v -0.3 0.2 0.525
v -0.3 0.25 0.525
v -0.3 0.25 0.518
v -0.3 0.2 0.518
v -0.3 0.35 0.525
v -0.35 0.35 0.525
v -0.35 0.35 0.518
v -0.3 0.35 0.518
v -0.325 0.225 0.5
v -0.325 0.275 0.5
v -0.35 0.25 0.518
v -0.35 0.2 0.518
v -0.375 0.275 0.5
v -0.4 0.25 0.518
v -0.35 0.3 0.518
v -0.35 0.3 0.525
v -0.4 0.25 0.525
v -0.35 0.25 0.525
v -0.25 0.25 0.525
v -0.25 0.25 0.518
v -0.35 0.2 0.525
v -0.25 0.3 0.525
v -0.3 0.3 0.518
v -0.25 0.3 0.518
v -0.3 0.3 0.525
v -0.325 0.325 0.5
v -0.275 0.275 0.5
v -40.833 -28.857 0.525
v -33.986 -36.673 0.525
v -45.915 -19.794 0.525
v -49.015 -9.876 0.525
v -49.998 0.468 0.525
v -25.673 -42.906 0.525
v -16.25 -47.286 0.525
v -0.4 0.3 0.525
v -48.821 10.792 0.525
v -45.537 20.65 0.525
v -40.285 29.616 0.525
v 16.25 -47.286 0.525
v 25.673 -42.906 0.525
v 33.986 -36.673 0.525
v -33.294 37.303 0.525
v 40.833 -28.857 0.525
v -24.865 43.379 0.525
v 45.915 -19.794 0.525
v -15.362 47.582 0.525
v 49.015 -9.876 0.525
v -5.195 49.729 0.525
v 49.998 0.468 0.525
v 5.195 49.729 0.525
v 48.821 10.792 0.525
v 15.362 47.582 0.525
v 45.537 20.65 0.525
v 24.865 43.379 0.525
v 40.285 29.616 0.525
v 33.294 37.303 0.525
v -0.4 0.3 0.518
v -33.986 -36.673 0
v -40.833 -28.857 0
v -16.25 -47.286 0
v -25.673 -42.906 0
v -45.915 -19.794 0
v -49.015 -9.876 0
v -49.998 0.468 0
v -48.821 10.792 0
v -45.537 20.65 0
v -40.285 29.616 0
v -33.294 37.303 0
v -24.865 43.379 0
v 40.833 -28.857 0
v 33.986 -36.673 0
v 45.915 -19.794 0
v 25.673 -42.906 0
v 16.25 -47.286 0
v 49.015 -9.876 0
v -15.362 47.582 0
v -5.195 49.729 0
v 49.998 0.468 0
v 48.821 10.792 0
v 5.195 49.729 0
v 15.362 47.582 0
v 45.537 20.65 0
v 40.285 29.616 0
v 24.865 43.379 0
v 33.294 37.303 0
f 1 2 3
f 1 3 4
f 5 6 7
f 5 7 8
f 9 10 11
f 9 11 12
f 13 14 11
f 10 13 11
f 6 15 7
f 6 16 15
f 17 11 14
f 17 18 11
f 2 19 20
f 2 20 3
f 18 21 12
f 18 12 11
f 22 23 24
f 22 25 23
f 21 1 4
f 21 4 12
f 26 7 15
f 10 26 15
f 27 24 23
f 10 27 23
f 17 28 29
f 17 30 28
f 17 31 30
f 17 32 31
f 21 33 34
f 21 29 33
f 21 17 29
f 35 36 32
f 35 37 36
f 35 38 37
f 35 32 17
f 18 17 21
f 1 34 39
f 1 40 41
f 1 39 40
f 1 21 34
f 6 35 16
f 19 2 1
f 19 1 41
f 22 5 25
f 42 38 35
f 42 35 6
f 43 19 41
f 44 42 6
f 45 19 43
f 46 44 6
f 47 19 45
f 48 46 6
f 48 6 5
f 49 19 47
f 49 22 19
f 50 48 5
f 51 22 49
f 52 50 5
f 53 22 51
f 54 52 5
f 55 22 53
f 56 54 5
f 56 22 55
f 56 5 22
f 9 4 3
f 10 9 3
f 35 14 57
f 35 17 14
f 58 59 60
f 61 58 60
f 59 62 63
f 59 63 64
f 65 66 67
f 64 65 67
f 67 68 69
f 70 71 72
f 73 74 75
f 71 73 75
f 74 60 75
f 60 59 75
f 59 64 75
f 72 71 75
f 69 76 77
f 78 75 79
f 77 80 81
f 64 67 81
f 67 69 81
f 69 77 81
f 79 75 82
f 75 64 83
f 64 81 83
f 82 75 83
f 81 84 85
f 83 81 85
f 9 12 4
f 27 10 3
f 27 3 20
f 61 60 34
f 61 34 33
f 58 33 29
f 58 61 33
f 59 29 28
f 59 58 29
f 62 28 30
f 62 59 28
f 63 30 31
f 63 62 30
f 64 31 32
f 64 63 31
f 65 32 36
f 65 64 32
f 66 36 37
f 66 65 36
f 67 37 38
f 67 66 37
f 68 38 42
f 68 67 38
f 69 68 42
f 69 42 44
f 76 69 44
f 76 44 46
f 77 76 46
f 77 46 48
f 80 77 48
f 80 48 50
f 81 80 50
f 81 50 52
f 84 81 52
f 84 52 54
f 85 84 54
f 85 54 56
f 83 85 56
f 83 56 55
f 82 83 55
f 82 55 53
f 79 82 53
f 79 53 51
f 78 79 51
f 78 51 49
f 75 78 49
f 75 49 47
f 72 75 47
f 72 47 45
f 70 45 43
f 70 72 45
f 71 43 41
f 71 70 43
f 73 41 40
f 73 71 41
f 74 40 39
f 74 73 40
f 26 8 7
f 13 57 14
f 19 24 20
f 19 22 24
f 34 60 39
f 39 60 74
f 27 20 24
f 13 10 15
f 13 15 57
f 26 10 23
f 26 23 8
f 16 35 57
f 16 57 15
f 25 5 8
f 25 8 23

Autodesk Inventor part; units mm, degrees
ref_plane "YZ Plane" through (0, 0, 0) normal (1, 0, 0) x (0, 1, 0)
ref_plane "XZ Plane" through (0, 0, 0) normal (0, 1, 0) x (-1, 0, 0)
ref_plane "XY Plane" through (0, 0, 0) normal (0, 0, 1) x (1, 0, 0)
sketch "Sketch1" plane through (0, 0, 0) normal (0, 0, 1) x (1, 0, 0)
  circle A0 centre (0, 0) radius 50
  line L0 (-16.25, -47.2857) -> (16.25, -47.2857)
  dimension "d1" = 32.5
  dimension "d2" = 100
extrude "Extrusion1" add sketch "Sketch1" along normal blind 0.525 contours A0 L0 picked at (-0.3738, -14.8613)
sketch "Sketch2" plane through (0, 0, 0.525) normal (0, 0, 1) x (1, 0, 0)
  arc A0 (16.25, -47.2857) -> (-16.25, -47.2857) centre (0, 0) ccw projected
  line L0 (-0.35, 0.35) -> (-0.3, 0.35)
  line L1 (-0.3, 0.35) -> (-0.3, 0.3)
  line L2 (-0.3, 0.3) -> (-0.25, 0.3)
  line L3 (-0.25, 0.3) -> (-0.25, 0.25)
  line L4 (-0.25, 0.25) -> (-0.3, 0.25)
  line L5 (-0.3, 0.25) -> (-0.3, 0.2)
  line L6 (-0.3, 0.2) -> (-0.35, 0.2)
  line L7 (-0.35, 0.2) -> (-0.35, 0.25)
  line L8 (-0.35, 0.25) -> (-0.4, 0.25)
  line L9 (-0.4, 0.25) -> (-0.4, 0.3)
  line L10 (-0.4, 0.3) -> (-0.35, 0.3)
  line L11 (-0.35, 0.3) -> (-0.35, 0.35)
  dimension "d5" = 0.05
  dimension "d6" = 0.25
  dimension "d7" = 0.25
extrude "Extrusion2" cut sketch "Sketch2" against normal blind 0.025
chamfer "Chamfer2" distance 0.0249 angle 35.3 12 edges at (-0.325, 0.35, 0.5) (-0.35, 0.325, 0.5) (-0.375, 0.3, 0.5) (-0.4, 0.275, 0.5) (-0.375, 0.25, 0.5) (-0.35, 0.225, 0.5) (-0.325, 0.2, 0.5) (-0.3, 0.225, 0.5) (-0.275, 0.25, 0.5) (-0.25, 0.275, 0.5) (-0.275, 0.3, 0.5) (-0.3, 0.325, 0.5) measured on face at (-0.3833, 0.2833, 0.5)
properties part number "combdrive-test" material "Silicon"
